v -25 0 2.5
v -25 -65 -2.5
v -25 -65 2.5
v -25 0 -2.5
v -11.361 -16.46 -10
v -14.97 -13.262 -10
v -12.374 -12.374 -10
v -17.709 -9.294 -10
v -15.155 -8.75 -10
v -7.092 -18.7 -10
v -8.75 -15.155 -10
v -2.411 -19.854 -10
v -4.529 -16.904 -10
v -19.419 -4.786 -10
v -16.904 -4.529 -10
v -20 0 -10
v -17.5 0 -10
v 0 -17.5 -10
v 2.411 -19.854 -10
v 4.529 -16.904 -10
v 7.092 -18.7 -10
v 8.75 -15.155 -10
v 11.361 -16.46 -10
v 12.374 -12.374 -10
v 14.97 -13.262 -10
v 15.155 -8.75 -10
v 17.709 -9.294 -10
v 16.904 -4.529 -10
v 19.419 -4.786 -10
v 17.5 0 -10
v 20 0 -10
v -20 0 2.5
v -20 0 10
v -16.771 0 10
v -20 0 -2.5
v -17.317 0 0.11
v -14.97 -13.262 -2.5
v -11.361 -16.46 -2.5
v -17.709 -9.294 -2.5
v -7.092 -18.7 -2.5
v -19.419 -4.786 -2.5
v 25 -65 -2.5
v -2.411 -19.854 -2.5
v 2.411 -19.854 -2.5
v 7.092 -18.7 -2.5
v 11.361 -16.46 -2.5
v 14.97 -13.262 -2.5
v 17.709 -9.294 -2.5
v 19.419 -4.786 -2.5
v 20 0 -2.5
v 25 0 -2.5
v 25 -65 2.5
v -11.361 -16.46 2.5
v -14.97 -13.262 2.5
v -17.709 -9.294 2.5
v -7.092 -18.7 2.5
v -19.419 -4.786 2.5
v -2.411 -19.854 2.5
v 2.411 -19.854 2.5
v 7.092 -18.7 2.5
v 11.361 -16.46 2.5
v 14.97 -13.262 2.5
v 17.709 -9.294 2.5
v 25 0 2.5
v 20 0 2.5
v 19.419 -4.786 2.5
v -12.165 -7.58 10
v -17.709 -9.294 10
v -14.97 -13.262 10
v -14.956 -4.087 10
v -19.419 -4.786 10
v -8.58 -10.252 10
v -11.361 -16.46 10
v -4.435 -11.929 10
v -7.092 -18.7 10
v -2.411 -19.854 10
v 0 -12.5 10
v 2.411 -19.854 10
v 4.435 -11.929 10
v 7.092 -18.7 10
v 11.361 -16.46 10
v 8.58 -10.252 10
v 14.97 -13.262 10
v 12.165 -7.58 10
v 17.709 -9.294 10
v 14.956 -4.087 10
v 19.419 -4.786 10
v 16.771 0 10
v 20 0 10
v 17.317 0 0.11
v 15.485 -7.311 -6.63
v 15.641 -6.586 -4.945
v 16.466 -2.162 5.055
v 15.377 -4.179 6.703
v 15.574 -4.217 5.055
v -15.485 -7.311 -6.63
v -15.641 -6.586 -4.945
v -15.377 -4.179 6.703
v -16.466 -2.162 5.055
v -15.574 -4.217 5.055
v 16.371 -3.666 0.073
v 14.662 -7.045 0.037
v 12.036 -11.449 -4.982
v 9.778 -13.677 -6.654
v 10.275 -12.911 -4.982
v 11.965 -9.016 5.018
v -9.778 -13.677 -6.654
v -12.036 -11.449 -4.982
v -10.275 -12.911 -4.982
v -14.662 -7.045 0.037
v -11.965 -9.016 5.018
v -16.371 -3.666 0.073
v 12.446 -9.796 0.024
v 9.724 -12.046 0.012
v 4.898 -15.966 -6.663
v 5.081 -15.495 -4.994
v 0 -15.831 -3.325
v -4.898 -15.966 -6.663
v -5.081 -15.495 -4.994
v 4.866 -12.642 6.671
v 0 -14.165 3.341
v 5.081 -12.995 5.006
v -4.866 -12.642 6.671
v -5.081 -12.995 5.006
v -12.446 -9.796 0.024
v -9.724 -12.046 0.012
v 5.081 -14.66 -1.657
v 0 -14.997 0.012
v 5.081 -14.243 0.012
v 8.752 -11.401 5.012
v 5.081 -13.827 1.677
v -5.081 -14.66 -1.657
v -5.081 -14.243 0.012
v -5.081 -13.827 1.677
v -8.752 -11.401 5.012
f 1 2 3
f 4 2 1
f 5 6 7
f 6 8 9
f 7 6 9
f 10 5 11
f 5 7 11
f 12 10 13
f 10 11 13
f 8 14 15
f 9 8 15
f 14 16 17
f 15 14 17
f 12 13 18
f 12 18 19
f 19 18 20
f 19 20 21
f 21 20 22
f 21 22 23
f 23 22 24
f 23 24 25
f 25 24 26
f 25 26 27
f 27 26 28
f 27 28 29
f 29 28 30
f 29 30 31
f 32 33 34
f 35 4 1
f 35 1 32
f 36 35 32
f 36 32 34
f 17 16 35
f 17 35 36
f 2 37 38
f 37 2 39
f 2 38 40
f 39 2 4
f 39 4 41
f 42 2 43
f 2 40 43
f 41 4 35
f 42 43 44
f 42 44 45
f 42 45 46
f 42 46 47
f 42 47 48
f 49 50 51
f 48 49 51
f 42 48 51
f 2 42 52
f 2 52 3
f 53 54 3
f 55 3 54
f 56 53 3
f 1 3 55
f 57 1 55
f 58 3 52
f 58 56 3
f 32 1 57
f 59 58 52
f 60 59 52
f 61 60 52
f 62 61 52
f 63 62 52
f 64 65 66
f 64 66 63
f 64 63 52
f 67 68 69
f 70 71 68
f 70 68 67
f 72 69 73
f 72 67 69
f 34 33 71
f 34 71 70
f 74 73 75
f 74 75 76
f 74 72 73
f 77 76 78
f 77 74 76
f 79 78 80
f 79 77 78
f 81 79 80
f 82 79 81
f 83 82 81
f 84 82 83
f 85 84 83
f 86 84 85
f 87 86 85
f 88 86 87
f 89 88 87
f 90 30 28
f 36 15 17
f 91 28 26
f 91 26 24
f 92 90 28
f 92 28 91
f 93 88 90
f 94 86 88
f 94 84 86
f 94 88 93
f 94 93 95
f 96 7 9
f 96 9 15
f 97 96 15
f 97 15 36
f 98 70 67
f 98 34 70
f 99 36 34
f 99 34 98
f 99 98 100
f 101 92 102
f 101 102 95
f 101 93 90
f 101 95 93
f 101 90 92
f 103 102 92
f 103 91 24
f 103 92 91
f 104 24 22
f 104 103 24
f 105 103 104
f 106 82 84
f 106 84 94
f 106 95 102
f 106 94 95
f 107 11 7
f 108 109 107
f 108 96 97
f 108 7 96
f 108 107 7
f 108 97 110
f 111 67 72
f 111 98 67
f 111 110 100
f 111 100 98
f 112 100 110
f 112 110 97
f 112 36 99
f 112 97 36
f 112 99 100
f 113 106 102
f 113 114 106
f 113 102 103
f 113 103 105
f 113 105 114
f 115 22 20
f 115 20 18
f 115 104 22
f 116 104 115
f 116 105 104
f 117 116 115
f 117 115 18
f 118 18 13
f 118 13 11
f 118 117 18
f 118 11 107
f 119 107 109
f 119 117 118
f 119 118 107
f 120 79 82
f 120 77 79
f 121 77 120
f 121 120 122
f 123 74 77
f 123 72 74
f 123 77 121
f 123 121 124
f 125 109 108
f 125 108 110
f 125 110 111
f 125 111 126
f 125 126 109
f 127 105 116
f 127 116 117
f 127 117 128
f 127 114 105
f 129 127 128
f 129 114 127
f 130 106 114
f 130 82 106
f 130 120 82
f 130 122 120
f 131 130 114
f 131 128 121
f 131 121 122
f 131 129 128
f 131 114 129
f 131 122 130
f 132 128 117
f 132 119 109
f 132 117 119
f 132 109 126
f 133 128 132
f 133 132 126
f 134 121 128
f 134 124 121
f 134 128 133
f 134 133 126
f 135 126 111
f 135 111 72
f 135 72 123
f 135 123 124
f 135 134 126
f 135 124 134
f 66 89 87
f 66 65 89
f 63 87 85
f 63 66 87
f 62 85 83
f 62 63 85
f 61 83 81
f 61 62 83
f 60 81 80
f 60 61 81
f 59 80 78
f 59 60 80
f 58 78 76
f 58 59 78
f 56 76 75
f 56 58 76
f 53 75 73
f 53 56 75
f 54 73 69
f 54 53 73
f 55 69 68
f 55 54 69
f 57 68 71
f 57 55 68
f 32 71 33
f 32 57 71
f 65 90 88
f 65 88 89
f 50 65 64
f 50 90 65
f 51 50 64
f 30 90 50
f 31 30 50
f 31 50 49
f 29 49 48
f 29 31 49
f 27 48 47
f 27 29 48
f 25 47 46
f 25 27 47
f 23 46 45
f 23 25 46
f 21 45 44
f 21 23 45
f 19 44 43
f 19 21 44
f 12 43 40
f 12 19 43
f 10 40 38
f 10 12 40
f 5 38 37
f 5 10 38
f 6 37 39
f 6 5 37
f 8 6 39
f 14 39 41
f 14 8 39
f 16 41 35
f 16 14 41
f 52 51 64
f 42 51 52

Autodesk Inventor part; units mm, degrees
ref_plane "YZ Plane" through (0, 0, 0) normal (1, 0, 0) x (0, 1, 0)
ref_plane "XZ Plane" through (0, 0, 0) normal (0, 1, 0) x (-1, 0, 0)
ref_plane "XY Plane" through (0, 0, 0) normal (0, 0, 1) x (1, 0, 0)
sketch "草圖1" plane through (0, 0, 0) normal (0, 0, 1) x (1, 0, 0)
  arc A0 (-17.5, 0) -> (17.5, 0) centre (0, 0) ccw
  arc A1 (-20, 0) -> (20, 0) centre (0, 0) ccw
  line L0 (-20, 0) -> (-17.5, 0)
  line L1 (20, 0) -> (17.5, 0)
  line L2 (-35, 0) -> (35, 0) projected
  line L3 (-25, 0) -> (25, 0)
  line L4 (25, -65) -> (-25, -65)
  line L5 (-25, -65) -> (-25, 0)
  line L6 (-25, 0) -> (25, 0)
  line L7 (25, 0) -> (25, -65)
  line L8 (25, -65) -> (-25, 0) construction
  line L9 (-25, -65) -> (25, 0) construction
  line L10 (0, -78) -> (0, 13) projected
  point P0 (17.5, 0)
  point P1 (20, 0)
  point P2 (20, 0)
  point P3 (0, -32.5)
  dimension "d0" = 17.5
  dimension "d16" = 50
  dimension "d17" = 65
  dimension "d22" = 20
extrude "擠出1" add sketch "草圖1" along normal mid plane 20 contours L2 L10 A0 | A0 L10 A1 L0 | L10 L2 A0 | A0 L1 A1 L10
extrude "擠出2" add sketch "草圖1" along normal mid plane 5
sketch "草圖2" plane through (0, 0, 0) normal (1, 0, 0) x (0, 1, 0)
  line L0 (-10, -10) -> (-5, 10)
  line L1 (0, -2.5) -> (0, -10) projected
  line L2 (0, 10) -> (0, 2.5) projected
  line L3 (-20, -10) -> (0, -10) projected
  line L4 (0, 10) -> (-20, 10) projected
  point P0 (0, 0)
  dimension "d18" = 10
  dimension "d19" = 5
sketch "草圖3" plane through (0, 0, -10) normal (0, 0, -1) x (-1, 0, 0)
  arc A0 (-17.5, 0) -> (17.5, 0) centre (0, 0) ccw projected
  line L0 (25, 0) -> (-25, 0) projected
sweep "掃掠1" cut profiles "草圖3" path "草圖2" path curves L0
